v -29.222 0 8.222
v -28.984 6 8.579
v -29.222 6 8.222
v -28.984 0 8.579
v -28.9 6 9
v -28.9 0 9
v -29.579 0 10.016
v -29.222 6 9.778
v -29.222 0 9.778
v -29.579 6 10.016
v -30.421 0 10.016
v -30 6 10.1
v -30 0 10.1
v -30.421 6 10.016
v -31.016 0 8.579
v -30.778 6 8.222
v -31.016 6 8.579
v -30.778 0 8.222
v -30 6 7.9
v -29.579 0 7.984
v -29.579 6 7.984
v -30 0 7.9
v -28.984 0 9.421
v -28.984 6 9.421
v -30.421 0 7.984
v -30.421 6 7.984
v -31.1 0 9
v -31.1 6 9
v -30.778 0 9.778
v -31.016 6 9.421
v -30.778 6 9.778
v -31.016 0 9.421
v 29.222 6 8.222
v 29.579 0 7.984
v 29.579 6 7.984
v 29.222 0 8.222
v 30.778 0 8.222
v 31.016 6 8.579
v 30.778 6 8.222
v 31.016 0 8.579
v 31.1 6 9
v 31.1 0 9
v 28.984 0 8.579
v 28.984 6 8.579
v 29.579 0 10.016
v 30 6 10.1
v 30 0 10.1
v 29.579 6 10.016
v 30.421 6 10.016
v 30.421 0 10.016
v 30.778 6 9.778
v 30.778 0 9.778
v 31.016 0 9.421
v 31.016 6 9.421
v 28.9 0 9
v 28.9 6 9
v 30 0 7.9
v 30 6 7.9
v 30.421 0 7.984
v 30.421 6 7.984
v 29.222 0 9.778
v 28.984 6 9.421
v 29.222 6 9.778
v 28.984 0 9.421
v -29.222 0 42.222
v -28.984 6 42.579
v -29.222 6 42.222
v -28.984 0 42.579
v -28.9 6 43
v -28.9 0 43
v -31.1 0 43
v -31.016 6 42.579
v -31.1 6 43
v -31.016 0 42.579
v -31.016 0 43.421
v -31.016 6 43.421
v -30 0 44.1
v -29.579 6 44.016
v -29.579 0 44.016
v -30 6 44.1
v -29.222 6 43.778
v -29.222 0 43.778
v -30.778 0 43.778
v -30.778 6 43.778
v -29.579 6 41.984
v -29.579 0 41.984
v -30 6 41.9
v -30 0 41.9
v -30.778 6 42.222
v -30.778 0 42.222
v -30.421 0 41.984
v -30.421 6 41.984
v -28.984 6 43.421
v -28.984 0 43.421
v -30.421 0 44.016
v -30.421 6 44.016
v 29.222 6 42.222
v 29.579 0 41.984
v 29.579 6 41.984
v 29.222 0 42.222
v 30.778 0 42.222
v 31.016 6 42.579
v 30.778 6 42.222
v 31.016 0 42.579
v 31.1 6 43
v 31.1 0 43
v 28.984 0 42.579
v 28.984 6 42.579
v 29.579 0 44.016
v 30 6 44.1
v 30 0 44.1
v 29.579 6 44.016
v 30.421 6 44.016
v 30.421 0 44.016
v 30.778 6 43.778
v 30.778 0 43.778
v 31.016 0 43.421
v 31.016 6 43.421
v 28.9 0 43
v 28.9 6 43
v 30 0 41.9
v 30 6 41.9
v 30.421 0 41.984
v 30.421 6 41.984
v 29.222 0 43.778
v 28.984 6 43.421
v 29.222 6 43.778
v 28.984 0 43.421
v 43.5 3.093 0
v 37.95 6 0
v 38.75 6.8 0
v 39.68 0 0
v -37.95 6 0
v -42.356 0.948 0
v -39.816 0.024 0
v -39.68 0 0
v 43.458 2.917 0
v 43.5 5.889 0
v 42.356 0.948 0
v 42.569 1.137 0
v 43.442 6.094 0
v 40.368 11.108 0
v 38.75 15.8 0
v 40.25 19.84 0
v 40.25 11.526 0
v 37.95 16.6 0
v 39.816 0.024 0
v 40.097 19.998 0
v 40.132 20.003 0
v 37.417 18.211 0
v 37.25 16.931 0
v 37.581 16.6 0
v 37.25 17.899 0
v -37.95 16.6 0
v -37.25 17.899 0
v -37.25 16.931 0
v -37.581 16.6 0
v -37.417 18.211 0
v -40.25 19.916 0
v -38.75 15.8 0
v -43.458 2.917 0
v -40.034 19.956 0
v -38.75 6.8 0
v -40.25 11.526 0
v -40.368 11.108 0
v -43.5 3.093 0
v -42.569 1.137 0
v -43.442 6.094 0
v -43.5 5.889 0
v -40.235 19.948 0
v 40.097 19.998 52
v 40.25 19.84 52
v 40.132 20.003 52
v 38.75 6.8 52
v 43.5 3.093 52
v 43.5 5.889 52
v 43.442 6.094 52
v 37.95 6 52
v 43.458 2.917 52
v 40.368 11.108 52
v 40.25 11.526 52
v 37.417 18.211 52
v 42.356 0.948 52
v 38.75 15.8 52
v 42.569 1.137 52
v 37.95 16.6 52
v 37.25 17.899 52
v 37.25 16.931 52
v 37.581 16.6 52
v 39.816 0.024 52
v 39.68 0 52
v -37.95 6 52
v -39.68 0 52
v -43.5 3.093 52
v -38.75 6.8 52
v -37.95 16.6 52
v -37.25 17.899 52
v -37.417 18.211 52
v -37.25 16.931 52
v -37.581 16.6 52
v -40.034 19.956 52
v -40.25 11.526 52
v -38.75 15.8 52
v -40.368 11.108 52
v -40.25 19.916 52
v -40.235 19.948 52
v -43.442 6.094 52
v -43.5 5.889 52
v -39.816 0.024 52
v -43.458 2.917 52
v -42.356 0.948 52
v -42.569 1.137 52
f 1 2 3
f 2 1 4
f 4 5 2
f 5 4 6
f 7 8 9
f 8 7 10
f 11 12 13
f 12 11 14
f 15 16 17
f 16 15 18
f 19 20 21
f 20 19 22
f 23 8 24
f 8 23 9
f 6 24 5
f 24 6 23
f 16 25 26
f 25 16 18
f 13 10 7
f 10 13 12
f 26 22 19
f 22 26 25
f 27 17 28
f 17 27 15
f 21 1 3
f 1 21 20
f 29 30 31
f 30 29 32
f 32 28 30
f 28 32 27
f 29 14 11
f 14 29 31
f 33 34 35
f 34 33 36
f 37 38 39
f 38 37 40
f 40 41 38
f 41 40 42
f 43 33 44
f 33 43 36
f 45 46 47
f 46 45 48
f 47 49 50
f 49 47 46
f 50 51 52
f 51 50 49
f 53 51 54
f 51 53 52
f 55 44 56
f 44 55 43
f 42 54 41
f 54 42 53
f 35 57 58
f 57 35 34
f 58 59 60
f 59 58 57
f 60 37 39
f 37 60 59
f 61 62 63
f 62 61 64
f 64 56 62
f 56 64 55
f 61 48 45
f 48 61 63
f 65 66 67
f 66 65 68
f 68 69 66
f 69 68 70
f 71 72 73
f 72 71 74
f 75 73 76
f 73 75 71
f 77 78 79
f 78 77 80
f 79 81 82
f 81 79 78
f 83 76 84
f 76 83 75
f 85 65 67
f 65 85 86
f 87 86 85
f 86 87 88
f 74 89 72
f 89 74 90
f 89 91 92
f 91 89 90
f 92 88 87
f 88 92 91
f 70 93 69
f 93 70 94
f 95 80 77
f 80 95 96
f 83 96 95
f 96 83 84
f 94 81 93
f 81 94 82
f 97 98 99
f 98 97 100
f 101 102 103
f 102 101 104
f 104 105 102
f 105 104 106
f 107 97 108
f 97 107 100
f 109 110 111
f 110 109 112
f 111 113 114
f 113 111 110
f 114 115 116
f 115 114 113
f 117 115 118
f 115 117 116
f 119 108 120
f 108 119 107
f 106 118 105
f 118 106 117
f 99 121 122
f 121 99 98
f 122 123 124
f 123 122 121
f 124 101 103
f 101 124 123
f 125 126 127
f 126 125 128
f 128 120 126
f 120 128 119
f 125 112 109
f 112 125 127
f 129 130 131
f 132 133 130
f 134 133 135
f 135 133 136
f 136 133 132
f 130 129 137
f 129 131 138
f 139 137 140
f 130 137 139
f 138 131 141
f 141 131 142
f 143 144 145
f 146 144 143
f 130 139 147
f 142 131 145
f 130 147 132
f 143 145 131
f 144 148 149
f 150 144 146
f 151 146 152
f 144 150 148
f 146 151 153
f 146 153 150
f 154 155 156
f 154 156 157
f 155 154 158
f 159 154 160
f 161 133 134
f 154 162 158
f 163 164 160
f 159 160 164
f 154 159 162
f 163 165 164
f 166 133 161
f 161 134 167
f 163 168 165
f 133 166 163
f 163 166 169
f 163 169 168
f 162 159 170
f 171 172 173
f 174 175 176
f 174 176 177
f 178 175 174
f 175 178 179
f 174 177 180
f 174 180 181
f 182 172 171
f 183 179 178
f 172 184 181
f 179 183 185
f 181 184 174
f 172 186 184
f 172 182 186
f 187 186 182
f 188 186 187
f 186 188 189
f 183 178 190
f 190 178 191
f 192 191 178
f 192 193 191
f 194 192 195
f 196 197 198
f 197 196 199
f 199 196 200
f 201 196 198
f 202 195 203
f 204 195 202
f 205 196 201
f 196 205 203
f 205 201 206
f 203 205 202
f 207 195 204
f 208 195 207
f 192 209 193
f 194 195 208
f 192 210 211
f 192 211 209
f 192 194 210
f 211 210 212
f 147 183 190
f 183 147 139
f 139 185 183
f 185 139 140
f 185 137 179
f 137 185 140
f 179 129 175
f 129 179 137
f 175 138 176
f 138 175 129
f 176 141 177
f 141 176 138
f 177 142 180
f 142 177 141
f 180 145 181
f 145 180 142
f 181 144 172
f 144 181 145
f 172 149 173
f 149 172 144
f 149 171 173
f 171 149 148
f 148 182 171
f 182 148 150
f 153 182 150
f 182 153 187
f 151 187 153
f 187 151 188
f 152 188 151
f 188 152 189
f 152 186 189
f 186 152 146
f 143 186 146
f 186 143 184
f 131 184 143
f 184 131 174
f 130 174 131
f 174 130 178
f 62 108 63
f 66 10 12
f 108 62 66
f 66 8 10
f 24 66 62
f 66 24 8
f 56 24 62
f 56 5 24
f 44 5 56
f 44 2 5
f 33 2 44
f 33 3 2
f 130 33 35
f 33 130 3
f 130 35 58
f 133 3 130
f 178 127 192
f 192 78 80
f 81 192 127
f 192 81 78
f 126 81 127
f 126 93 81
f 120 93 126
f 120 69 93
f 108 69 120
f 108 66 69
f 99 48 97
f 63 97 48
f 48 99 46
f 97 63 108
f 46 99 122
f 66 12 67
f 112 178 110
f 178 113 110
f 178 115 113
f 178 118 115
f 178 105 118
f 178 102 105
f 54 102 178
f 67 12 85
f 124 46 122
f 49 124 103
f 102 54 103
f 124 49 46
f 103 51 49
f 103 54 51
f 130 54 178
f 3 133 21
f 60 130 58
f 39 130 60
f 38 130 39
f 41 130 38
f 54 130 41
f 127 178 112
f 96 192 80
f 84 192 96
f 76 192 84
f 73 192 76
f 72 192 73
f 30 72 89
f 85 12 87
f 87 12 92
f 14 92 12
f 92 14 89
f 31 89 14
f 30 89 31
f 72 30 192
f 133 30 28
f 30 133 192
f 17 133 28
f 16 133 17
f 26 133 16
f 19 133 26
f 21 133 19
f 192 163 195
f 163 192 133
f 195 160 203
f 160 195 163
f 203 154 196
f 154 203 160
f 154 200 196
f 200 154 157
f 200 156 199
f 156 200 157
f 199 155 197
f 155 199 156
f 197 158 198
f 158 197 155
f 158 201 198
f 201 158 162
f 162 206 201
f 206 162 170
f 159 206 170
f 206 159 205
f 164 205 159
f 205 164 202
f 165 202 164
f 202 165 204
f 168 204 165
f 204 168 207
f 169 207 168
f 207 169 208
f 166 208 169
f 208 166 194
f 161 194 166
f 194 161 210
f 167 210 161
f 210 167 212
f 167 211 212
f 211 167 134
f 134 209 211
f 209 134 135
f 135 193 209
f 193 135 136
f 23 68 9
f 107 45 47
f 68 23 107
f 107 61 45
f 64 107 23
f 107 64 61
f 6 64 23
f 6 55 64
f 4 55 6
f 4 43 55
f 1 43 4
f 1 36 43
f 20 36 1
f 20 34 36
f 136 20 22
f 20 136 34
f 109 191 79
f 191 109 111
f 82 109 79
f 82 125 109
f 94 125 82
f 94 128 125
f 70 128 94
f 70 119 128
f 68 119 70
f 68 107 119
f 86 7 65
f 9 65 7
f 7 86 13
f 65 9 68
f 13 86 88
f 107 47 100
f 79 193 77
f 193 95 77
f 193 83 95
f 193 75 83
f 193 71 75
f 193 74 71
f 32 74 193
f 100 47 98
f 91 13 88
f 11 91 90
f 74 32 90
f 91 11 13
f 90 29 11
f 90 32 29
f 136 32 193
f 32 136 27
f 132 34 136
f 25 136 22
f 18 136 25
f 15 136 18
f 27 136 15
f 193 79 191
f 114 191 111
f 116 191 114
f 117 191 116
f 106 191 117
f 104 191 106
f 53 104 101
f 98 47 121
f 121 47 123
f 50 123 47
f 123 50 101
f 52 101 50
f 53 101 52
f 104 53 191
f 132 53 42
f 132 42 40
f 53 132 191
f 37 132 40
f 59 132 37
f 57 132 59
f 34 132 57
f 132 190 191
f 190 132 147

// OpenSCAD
// file: paths.scad
function sumTo(v,n) = n<=0 ? 0 : v[n-1]+sumTo(v,n-1);
function sum(v) = sumTo(v,len(v));
function interpolationData(v) = let(
    n=len(v)-1,
    d=[for (i=[0:n-1]) norm(v[i]-v[i+1])],
    sumD=[for (i=[0:n]) sumTo(d,i)],
    totalD=sumD[n]) 
        [d,sumD,v,totalD];
function totalLength(interp) = interp[3];
function interpolatePoints(a,b,t) = (1-t)*a+(t)*b;
function findSegmentByDistance(sumD,distance) = let(
    found = [for(i=[0:len(sumD)-1]) if(sumD[i]<=distance && distance<sumD[i+1]) i])
        len(found)>0 ? found[0] : -1;
function interpolateByDistance(interp,distance) = let(
    n=len(interp[1])-1,
    d=interp[0],
    sumD=interp[1],
    v=interp[2],
    totalD=interp[3],
    i=findSegmentByDistance(sumD,distance))
        i<0 ? (distance<totalD/2 ? v[0] : v[n]) :
            interpolatePoints(v[i],v[i+1],(distance-sumD[i])/d[i]);
function get2DNormalBetweenPoints(a,b) = let(
    v = (b-a)/norm(b-a))
        [v[1],-v[0]];
    
function getTangentByDistance(interp,distance) = let(
    n=len(interp[1])-1,
    d=interp[0],
    sumD=interp[1],
    v=interp[2],
    totalD=interp[3],
    i0=findSegmentByDistance(sumD,distance),
    i = i0 < 0 ? (distance<totalD/2 ? 0 : n-1) : i0)
        (v[i+1]-v[i])/norm(v[i+1]-v[i]);
    
function interpolateByParameter(interp,t) = interpolateByDistance(interp,t*totalLength(interp));
function singleInterpolateByDistance(v,distance) = interpolateByDistance(interpolationData(v),distance);
function singleInterpolateByParameter(v,t) = interpolateByParameter(interpolationData(v),t);
function measurePath(v) = totalLength(interpolationData(v));

function findCoordinateIntersection2(a,b,index,value) = 
    a[index] == value ? a : 
        b[index] == value ? b :
            let( t=(value-a[index]) / (b[index]-a[index]))
                (1-t)*a+t*b;

function findCoordinateIntersections(path,index,value) = 
    [for (i=[0:len(path)-2]) if ((path[i][index]-value)*(path[i+1][index]-value) <= 0) findCoordinateIntersection2(path[i],path[i+1],index,value)];            

function mirrorMatrix(normalVector) = let(v = normalVector/norm(normalVector)) len(v)<3 ? [[1-2*v[0]*v[0],-2*v[0]*v[1]],[-2*v[0]*v[1],1-2*v[1]*v[1]]] : [[1-2*v[0]*v[0],-2*v[0]*v[1],-2*v[0]*v[2]],[-2*v[0]*v[1],1-2*v[1]*v[1],-2*v[1]*v[2]],[-2*v[0]*v[2],-2*v[1]*v[2],1-2*v[2]*v[2]]];

function trimArray(a, n) = [for (i=[0:n-1]) a[i]];

function transformPoint(matrix,a) = 
    let(n=len(a))
        len(matrix[0])==n+1 ? 
            trimArray(matrix * concat(a,[1]), n)
            : matrix * a;

function transformPath(matrix,path) =
    [for (a=path) transformPoint(matrix,a)];

function reverseArray(array) = let(n=len(array)) [for (i=[0:n-1]) array[n-1-i]];

function stitchPaths(a,b) = let(na=len(a)) [for (i=[0:na+len(b)-2]) i<na? a[i] : b[i-na+1]-b[0]+a[na-1]];

//interp = interpolationData([[1,2],[2,3],[1,2]]);
//echo(singleInterpolateByParameter([[1,1],[2,2],[3,1]],0.75));
//echo(measurePath([[1,2],[2,3],[1,2]]));

function _removeDuplicates(v, closed=false, out=[], pos=0) =
    pos >= len(v) ? out :
    (pos==0 && closed && v[0] == v[len(v)-1]) || (pos>0 && v[pos] == v[pos-1]) ? _removeDuplicates(v, closed=closed, out=out, pos=pos+1) : _removeDuplicates(v, closed=closed, out=concat(out, [v[pos]]), pos=pos+1);

function _normalizeVectorSafe(v) = let(l=norm(v)) l==0?v:v/norm(v);

function _insetVertex(path,distance,closed,pos) = 
    let( npos = (pos+1)%len(path),
         ppos = (pos+len(path)-1)%len(path),
         next = closed || pos+1 < len(path) ? path[npos]-path[pos] : path[pos]-path[ppos],
         prev = closed || 0<pos ? path[pos]-path[ppos] : path[npos]-path[pos],
         avg = _normalizeVectorSafe(prev)+_normalizeVectorSafe(next),
        turned = _normalizeVectorSafe([-avg[1],avg[0]]) )
        path[pos] + turned * distance;

function _insetPath(path=[],distance=2, closed=true, out=[], pos=0) =
    pos >= len(path) ? out :
    _insetPath(path=path,distance=distance,closed=closed,out=concat(out,[_insetVertex(path,distance,closed,pos)]),pos=pos+1);    

function insetPath(path=[], distance=2, closed=true) =
    let(path=_removeDuplicates(path, closed=true))
    _insetPath(path=path,distance=distance,closed=closed);
    
//<skip>
n = 10;
demo = [for(i=[0:n-1]) 10*[cos(360*i/n),sin(360*i/n)]];
difference() 
{
    polygon(insetPath(demo,distance=-2));
    polygon(insetPath(demo,distance=2));
}    
//</skip>
// main file
use <paths.scad>;

//<params>
attachmentThickness = 2.5;
attachmentWidth = 18;
b1 = 79.5;
b1a = 85.0;
b2 = 87;
h1a = 1;
bumpHeight = 3;
extraThickness = 3; //3.5;
phoneWidth = 77.5;
snapHeight = 10.6;
snapInset = 1.5;
snapThickness = 1.5;
holderWidth = 52;
rounding = 0.8;
holeSize = 2.2;
holeSpacing = 60;
//</params>

module dummy() {}

nudge = 0.001;

rightPath = 
  [ [b1/2,0],
    [b1a/2,h1a],
    [b2/2,bumpHeight],
    [b2/2,bumpHeight+extraThickness],
    [phoneWidth/2+snapThickness,bumpHeight+extraThickness+snapHeight*0.5],
    [phoneWidth/2+snapThickness,bumpHeight+extraThickness+snapHeight+snapThickness+2],
    [phoneWidth/2-snapInset,bumpHeight+extraThickness+snapHeight+snapThickness],
    [phoneWidth/2-snapInset,bumpHeight+extraThickness+snapHeight],
    [phoneWidth/2,bumpHeight+extraThickness+snapHeight],
    [phoneWidth/2,bumpHeight+extraThickness],
    [0, bumpHeight+extraThickness]];
    
    
path = stitchPaths(rightPath,reverseArray(transformPath(mirrorMatrix([1,0]),rightPath)));

module mainHolder() {
    linear_extrude(height=holderWidth) 
offset(r=-rounding) offset(r=rounding) polygon(points=path);
}

module holes(extra=0) {
    for(i=[0:1]) translate(-[0,attachmentWidth/2+i*(holderWidth-attachmentWidth),0]) {
    translate([-holeSpacing/2,0,-50]) cylinder(d=holeSize+extra,h=100,$fn=16);
    translate([holeSpacing/2,0,-50]) cylinder(d=holeSize+extra,h=100,$fn=16);
    }
}

module attachment() {
    difference() {
       // hull()
    for(i=[0:1]) translate(-[0,attachmentWidth/2+i*(holderWidth-attachmentWidth),0]) 
        union()
        {
            translate([-holeSpacing/2,0,0]) cylinder(d=attachmentWidth, h=attachmentThickness);
            translate([holeSpacing/2,0,0]) cylinder(d=attachmentWidth, h=attachmentThickness);
        }
    holes(extra=1.5);
    }
}

render(convexity=2) {
    difference() {
        mainHolder();
        rotate([-90,0,0]) holes();
    }
//    translate([0,-10,0]) attachment();
}
